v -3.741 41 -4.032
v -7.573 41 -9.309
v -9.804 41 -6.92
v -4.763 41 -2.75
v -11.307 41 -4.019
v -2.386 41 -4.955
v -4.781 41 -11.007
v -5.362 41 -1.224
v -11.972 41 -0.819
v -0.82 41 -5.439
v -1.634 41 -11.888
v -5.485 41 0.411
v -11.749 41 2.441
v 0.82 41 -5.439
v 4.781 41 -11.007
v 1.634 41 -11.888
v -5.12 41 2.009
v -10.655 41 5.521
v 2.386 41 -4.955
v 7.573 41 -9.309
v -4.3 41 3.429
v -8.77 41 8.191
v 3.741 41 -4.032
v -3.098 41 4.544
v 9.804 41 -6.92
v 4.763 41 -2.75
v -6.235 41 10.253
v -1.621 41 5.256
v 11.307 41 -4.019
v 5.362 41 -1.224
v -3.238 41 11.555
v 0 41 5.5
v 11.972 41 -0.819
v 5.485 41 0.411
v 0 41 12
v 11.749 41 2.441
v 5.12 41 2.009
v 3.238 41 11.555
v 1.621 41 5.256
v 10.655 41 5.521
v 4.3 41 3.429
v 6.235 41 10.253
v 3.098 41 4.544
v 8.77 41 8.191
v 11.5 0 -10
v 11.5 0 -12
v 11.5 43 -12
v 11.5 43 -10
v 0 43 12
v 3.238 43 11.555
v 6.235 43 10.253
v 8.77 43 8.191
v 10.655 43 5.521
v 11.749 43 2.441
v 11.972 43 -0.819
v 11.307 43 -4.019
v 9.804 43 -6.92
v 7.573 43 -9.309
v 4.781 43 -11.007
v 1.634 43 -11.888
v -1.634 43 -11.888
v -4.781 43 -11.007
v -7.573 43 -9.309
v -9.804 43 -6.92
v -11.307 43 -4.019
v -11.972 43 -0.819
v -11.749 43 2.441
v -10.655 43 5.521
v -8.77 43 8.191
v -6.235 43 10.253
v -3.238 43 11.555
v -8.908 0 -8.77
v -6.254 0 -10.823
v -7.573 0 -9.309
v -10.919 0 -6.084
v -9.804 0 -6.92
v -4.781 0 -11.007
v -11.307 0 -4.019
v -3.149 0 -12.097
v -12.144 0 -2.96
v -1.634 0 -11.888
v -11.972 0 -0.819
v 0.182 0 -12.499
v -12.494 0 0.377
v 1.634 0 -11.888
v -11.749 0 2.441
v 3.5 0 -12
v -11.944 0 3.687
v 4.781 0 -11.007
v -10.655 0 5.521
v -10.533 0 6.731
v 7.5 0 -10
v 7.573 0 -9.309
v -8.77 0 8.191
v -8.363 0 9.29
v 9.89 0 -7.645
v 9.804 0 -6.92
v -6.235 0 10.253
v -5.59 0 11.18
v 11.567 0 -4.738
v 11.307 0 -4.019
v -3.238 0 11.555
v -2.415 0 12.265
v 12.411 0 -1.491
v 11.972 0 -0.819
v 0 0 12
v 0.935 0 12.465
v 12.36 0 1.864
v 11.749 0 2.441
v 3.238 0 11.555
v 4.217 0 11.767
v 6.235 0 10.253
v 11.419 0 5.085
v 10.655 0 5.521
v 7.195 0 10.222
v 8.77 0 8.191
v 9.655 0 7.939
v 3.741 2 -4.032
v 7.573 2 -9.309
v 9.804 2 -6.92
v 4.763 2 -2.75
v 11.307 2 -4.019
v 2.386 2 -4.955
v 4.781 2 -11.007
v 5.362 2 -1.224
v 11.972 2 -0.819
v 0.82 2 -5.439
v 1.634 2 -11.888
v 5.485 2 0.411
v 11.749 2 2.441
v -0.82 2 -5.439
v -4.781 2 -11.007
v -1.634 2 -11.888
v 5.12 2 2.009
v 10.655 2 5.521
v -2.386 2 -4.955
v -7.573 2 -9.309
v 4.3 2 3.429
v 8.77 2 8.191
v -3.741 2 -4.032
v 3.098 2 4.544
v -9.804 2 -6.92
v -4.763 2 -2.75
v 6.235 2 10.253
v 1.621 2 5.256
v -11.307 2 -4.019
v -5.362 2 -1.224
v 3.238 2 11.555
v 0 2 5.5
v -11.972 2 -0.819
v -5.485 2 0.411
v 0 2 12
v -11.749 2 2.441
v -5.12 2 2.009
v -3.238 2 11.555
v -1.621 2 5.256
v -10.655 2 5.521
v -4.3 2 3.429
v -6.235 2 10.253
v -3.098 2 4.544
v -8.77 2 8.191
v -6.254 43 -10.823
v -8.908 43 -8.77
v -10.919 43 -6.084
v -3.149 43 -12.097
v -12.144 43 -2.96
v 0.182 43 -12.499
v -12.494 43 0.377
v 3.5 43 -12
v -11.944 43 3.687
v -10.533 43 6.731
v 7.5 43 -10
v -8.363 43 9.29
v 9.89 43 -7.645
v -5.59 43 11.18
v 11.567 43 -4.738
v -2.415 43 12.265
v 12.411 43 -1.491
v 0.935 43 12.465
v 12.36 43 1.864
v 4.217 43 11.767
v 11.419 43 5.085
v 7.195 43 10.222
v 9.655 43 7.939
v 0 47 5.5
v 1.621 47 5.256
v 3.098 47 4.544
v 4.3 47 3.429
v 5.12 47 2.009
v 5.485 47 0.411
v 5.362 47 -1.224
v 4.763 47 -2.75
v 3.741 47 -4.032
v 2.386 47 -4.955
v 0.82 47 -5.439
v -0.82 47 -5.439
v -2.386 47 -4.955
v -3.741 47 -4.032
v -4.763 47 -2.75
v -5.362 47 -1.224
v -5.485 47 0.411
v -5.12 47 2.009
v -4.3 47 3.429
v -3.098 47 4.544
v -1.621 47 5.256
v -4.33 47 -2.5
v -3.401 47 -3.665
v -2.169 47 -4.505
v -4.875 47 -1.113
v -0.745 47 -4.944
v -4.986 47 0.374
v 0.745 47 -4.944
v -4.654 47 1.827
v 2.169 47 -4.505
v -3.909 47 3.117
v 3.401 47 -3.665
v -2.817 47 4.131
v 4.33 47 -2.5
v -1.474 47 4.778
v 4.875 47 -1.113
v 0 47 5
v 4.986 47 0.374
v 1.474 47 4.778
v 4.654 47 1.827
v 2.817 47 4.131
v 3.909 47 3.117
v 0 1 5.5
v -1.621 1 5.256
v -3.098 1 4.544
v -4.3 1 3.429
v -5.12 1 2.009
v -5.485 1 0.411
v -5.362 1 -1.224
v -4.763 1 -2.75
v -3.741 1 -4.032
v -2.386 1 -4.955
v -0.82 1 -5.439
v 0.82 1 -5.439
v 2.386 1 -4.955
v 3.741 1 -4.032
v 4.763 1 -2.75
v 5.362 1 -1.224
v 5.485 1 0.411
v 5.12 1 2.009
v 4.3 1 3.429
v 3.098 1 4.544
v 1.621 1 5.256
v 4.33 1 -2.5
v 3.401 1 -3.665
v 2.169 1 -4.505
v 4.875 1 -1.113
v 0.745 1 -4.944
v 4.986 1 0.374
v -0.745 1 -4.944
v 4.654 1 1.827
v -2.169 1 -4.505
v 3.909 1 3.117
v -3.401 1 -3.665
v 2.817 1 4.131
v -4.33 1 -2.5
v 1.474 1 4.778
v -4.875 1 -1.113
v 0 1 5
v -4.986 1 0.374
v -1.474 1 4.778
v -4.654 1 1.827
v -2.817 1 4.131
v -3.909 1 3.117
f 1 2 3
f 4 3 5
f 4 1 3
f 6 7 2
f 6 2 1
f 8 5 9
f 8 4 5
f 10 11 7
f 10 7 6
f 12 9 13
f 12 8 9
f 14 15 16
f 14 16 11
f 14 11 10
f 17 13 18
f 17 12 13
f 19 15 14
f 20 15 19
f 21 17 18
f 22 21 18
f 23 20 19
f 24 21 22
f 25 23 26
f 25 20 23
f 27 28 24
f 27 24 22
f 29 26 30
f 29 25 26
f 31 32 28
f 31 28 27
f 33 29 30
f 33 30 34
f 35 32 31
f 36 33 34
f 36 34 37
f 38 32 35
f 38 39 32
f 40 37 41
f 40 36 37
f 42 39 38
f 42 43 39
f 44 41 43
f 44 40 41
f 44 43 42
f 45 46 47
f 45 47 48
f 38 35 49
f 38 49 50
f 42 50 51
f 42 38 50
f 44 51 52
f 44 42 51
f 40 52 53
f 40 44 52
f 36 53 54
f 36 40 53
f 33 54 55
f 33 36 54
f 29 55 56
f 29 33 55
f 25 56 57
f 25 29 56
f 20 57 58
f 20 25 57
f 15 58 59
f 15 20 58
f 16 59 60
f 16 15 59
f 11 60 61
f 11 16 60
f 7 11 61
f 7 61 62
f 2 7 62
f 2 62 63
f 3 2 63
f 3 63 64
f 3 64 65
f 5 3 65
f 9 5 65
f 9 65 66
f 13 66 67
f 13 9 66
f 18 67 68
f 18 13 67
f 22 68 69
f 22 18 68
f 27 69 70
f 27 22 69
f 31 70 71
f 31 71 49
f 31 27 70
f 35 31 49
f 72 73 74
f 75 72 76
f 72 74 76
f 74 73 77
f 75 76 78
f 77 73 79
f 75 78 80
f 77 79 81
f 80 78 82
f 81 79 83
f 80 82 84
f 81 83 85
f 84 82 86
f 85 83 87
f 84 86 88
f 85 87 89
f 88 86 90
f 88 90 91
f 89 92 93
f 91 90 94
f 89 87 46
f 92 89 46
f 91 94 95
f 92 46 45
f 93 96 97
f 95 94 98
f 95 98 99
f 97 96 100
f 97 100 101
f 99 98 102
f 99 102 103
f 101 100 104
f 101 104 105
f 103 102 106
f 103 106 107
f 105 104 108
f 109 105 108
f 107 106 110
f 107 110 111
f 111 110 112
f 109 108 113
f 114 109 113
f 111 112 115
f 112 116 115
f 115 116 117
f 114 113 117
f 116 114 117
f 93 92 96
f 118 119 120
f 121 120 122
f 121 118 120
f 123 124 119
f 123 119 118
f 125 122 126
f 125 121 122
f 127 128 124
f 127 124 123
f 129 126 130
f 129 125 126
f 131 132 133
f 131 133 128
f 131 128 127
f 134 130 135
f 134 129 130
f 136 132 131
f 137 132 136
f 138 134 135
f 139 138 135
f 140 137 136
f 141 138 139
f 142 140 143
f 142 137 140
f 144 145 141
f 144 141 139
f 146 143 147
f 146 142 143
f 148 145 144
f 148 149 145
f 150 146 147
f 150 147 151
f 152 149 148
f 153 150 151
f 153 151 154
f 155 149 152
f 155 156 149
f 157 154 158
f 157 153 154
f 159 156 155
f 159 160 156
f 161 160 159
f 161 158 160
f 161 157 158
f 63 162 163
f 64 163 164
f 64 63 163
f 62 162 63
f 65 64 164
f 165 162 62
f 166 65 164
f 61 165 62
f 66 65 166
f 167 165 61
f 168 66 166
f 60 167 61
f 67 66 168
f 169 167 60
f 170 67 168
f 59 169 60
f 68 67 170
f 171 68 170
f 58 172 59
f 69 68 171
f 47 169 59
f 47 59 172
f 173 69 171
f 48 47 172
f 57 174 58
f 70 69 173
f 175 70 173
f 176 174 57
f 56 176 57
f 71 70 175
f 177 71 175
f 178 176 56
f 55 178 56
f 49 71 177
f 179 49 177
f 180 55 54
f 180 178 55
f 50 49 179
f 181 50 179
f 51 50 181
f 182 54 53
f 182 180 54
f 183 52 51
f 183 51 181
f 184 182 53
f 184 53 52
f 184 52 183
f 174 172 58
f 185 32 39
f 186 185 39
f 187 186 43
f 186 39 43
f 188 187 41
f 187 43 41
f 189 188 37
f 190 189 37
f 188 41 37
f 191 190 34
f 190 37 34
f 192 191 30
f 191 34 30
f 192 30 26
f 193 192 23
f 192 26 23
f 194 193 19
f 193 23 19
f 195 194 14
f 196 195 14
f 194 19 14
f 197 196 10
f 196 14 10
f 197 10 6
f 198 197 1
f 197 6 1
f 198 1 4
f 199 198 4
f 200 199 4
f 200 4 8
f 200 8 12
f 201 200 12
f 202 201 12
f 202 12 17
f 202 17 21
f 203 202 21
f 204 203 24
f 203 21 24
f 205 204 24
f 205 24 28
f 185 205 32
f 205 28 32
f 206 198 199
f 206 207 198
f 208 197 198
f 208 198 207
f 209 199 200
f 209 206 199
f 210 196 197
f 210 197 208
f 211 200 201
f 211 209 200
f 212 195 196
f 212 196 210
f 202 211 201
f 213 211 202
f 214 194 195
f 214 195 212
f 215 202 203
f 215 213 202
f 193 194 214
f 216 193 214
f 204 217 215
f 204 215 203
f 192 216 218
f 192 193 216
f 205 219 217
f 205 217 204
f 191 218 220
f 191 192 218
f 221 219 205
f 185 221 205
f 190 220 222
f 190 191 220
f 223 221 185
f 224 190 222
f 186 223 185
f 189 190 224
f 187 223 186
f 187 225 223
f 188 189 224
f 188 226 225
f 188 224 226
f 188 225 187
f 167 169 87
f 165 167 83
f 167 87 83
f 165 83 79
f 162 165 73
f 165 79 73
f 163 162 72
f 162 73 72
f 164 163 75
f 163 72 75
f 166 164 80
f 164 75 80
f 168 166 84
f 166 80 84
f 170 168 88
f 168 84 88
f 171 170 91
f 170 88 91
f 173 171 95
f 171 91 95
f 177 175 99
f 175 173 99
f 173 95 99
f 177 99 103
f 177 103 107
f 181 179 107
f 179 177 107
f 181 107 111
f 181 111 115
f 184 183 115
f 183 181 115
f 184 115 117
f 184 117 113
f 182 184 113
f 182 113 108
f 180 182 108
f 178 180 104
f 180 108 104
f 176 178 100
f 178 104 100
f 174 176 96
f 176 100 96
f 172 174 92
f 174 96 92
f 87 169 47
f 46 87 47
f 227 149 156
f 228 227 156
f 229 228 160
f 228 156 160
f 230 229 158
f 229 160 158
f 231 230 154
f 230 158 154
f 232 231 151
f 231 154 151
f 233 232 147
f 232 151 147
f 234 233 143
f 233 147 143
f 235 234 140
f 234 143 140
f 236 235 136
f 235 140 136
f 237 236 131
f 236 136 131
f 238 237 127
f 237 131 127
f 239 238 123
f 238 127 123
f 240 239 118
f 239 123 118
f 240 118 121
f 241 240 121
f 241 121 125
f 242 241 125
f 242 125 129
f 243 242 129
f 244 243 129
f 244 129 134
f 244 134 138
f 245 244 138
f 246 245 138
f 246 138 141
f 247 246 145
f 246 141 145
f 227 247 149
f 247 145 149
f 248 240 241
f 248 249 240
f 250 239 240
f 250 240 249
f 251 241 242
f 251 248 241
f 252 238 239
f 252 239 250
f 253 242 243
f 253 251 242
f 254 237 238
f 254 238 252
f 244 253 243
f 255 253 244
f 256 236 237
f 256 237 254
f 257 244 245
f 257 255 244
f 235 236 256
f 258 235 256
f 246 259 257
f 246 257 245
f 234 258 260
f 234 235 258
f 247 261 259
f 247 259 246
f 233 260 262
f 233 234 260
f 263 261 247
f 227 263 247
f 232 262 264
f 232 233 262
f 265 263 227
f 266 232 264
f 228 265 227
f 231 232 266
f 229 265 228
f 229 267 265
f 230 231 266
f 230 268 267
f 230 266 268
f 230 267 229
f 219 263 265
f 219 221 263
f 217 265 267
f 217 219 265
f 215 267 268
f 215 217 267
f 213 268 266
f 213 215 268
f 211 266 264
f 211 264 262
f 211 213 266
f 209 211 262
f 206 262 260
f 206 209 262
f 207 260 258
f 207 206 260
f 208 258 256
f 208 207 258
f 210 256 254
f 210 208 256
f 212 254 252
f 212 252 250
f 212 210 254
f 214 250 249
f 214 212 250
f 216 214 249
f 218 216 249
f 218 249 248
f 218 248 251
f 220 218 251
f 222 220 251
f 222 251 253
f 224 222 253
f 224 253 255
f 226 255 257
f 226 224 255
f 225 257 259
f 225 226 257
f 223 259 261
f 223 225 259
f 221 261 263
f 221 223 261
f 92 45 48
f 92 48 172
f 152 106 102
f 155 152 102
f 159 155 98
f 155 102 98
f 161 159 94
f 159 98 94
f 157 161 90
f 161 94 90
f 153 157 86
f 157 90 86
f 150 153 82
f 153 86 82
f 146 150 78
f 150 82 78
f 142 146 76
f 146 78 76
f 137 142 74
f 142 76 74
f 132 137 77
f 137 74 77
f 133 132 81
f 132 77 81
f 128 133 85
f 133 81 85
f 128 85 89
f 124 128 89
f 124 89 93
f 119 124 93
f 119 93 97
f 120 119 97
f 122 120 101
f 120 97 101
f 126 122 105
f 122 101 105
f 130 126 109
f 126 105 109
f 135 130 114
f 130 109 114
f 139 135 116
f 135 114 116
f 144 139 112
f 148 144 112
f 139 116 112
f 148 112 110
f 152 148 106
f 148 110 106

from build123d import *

# Parameters (mm, degrees)
SKETCH1_R         = 12.5
ENCLOSURE_DEPTH   = 41
SKETCH3_R         = 12.5
SKETCH3_R_2       = 12
UPPER_LIP_DEPTH   = 2
SKETCH4_R         = 5.5
UPPER_SHAFT_DEPTH = 6
SKETCH5_R         = 5
CENTRAL_CUT_DEPTH = 51.214539727
SKETCH6_R         = 12
LOWER_LIP_DEPTH   = 2
SKETCH7_R         = 5.5
SKETCH7_R_2       = 5
LOWER_SHAFT_DEPTH = 1
FILM_START        = -43
FILM_LIP_DEPTH    = 43


with BuildPart() as part:
    # Sketch1 → Enclosure (new body)
    with BuildSketch(Plane(origin=(0, 0, 0), x_dir=(1, 0, 0), z_dir=(0, 1, 0))):
        with Locations(Location((0, 0, 0), (0, 0, 270))):
            Circle(SKETCH1_R)
    extrude(amount=ENCLOSURE_DEPTH)

    # Sketch3 → Upper Lip (add)
    with BuildSketch(Plane(origin=(0, 41, 0), x_dir=(1, 0, 0), z_dir=(0, 1, 0))):
        with Locations(Location((0, 0, 0), (0, 0, 270))):
            Circle(SKETCH3_R)
        with Locations(Location((0, 0, 0), (0, 0, 270))):
            Circle(SKETCH3_R_2, mode=Mode.SUBTRACT)
    extrude(amount=UPPER_LIP_DEPTH)

    # Sketch4 → Upper Shaft (add)
    with BuildSketch(Plane(origin=(0, 41, 0), x_dir=(1, 0, 0), z_dir=(0, 1, 0))):
        with Locations(Location((0, 0, 0), (0, 0, 270))):
            Circle(SKETCH4_R)
    extrude(amount=UPPER_SHAFT_DEPTH)

    # Sketch5 → Central Cut (cut, through all)
    with BuildSketch(Plane(origin=(0, 47, 0), x_dir=(1, 0, 0), z_dir=(0, 1, 0))):
        with Locations(Location((0, 0, 0), (0, 0, 270))):
            Circle(SKETCH5_R)
    extrude(amount=-CENTRAL_CUT_DEPTH, mode=Mode.SUBTRACT)

    # Sketch6 → Lower Lip (cut)
    with BuildSketch(Plane.XZ):
        with Locations(Location((0, 0, 0), (0, 0, 90))):
            Circle(SKETCH6_R)
    extrude(amount=-LOWER_LIP_DEPTH, mode=Mode.SUBTRACT)

    # Sketch7 → Lower Shaft (add)
    with BuildSketch(Plane(origin=(0, 2, 0), x_dir=(-1, 0, 0), z_dir=(0, -1, 0))):
        with Locations(Location((0, 0, 0), (0, 0, 270))):
            Circle(SKETCH7_R)
        with Locations(Location((0, 0, 0), (0, 0, 270))):
            Circle(SKETCH7_R_2, mode=Mode.SUBTRACT)
    extrude(amount=LOWER_SHAFT_DEPTH)

    # Sketch8 → Film Lip (add)
    with BuildSketch(Plane(origin=(0, 43, 0), x_dir=(1, 0, 0), z_dir=(0, 1, 0)).offset(FILM_START)):
        with BuildLine():
            Line((3.5, 12), (11.5, 12))
            Line((11.5, 12), (11.5, 10))
            Line((11.5, 10), (7.5, 10))
            ThreePointArc((7.5, 10), (5.590169944, 11.180339887), (3.5, 12))
        make_face()
    extrude(amount=FILM_LIP_DEPTH)


solid = part.part
